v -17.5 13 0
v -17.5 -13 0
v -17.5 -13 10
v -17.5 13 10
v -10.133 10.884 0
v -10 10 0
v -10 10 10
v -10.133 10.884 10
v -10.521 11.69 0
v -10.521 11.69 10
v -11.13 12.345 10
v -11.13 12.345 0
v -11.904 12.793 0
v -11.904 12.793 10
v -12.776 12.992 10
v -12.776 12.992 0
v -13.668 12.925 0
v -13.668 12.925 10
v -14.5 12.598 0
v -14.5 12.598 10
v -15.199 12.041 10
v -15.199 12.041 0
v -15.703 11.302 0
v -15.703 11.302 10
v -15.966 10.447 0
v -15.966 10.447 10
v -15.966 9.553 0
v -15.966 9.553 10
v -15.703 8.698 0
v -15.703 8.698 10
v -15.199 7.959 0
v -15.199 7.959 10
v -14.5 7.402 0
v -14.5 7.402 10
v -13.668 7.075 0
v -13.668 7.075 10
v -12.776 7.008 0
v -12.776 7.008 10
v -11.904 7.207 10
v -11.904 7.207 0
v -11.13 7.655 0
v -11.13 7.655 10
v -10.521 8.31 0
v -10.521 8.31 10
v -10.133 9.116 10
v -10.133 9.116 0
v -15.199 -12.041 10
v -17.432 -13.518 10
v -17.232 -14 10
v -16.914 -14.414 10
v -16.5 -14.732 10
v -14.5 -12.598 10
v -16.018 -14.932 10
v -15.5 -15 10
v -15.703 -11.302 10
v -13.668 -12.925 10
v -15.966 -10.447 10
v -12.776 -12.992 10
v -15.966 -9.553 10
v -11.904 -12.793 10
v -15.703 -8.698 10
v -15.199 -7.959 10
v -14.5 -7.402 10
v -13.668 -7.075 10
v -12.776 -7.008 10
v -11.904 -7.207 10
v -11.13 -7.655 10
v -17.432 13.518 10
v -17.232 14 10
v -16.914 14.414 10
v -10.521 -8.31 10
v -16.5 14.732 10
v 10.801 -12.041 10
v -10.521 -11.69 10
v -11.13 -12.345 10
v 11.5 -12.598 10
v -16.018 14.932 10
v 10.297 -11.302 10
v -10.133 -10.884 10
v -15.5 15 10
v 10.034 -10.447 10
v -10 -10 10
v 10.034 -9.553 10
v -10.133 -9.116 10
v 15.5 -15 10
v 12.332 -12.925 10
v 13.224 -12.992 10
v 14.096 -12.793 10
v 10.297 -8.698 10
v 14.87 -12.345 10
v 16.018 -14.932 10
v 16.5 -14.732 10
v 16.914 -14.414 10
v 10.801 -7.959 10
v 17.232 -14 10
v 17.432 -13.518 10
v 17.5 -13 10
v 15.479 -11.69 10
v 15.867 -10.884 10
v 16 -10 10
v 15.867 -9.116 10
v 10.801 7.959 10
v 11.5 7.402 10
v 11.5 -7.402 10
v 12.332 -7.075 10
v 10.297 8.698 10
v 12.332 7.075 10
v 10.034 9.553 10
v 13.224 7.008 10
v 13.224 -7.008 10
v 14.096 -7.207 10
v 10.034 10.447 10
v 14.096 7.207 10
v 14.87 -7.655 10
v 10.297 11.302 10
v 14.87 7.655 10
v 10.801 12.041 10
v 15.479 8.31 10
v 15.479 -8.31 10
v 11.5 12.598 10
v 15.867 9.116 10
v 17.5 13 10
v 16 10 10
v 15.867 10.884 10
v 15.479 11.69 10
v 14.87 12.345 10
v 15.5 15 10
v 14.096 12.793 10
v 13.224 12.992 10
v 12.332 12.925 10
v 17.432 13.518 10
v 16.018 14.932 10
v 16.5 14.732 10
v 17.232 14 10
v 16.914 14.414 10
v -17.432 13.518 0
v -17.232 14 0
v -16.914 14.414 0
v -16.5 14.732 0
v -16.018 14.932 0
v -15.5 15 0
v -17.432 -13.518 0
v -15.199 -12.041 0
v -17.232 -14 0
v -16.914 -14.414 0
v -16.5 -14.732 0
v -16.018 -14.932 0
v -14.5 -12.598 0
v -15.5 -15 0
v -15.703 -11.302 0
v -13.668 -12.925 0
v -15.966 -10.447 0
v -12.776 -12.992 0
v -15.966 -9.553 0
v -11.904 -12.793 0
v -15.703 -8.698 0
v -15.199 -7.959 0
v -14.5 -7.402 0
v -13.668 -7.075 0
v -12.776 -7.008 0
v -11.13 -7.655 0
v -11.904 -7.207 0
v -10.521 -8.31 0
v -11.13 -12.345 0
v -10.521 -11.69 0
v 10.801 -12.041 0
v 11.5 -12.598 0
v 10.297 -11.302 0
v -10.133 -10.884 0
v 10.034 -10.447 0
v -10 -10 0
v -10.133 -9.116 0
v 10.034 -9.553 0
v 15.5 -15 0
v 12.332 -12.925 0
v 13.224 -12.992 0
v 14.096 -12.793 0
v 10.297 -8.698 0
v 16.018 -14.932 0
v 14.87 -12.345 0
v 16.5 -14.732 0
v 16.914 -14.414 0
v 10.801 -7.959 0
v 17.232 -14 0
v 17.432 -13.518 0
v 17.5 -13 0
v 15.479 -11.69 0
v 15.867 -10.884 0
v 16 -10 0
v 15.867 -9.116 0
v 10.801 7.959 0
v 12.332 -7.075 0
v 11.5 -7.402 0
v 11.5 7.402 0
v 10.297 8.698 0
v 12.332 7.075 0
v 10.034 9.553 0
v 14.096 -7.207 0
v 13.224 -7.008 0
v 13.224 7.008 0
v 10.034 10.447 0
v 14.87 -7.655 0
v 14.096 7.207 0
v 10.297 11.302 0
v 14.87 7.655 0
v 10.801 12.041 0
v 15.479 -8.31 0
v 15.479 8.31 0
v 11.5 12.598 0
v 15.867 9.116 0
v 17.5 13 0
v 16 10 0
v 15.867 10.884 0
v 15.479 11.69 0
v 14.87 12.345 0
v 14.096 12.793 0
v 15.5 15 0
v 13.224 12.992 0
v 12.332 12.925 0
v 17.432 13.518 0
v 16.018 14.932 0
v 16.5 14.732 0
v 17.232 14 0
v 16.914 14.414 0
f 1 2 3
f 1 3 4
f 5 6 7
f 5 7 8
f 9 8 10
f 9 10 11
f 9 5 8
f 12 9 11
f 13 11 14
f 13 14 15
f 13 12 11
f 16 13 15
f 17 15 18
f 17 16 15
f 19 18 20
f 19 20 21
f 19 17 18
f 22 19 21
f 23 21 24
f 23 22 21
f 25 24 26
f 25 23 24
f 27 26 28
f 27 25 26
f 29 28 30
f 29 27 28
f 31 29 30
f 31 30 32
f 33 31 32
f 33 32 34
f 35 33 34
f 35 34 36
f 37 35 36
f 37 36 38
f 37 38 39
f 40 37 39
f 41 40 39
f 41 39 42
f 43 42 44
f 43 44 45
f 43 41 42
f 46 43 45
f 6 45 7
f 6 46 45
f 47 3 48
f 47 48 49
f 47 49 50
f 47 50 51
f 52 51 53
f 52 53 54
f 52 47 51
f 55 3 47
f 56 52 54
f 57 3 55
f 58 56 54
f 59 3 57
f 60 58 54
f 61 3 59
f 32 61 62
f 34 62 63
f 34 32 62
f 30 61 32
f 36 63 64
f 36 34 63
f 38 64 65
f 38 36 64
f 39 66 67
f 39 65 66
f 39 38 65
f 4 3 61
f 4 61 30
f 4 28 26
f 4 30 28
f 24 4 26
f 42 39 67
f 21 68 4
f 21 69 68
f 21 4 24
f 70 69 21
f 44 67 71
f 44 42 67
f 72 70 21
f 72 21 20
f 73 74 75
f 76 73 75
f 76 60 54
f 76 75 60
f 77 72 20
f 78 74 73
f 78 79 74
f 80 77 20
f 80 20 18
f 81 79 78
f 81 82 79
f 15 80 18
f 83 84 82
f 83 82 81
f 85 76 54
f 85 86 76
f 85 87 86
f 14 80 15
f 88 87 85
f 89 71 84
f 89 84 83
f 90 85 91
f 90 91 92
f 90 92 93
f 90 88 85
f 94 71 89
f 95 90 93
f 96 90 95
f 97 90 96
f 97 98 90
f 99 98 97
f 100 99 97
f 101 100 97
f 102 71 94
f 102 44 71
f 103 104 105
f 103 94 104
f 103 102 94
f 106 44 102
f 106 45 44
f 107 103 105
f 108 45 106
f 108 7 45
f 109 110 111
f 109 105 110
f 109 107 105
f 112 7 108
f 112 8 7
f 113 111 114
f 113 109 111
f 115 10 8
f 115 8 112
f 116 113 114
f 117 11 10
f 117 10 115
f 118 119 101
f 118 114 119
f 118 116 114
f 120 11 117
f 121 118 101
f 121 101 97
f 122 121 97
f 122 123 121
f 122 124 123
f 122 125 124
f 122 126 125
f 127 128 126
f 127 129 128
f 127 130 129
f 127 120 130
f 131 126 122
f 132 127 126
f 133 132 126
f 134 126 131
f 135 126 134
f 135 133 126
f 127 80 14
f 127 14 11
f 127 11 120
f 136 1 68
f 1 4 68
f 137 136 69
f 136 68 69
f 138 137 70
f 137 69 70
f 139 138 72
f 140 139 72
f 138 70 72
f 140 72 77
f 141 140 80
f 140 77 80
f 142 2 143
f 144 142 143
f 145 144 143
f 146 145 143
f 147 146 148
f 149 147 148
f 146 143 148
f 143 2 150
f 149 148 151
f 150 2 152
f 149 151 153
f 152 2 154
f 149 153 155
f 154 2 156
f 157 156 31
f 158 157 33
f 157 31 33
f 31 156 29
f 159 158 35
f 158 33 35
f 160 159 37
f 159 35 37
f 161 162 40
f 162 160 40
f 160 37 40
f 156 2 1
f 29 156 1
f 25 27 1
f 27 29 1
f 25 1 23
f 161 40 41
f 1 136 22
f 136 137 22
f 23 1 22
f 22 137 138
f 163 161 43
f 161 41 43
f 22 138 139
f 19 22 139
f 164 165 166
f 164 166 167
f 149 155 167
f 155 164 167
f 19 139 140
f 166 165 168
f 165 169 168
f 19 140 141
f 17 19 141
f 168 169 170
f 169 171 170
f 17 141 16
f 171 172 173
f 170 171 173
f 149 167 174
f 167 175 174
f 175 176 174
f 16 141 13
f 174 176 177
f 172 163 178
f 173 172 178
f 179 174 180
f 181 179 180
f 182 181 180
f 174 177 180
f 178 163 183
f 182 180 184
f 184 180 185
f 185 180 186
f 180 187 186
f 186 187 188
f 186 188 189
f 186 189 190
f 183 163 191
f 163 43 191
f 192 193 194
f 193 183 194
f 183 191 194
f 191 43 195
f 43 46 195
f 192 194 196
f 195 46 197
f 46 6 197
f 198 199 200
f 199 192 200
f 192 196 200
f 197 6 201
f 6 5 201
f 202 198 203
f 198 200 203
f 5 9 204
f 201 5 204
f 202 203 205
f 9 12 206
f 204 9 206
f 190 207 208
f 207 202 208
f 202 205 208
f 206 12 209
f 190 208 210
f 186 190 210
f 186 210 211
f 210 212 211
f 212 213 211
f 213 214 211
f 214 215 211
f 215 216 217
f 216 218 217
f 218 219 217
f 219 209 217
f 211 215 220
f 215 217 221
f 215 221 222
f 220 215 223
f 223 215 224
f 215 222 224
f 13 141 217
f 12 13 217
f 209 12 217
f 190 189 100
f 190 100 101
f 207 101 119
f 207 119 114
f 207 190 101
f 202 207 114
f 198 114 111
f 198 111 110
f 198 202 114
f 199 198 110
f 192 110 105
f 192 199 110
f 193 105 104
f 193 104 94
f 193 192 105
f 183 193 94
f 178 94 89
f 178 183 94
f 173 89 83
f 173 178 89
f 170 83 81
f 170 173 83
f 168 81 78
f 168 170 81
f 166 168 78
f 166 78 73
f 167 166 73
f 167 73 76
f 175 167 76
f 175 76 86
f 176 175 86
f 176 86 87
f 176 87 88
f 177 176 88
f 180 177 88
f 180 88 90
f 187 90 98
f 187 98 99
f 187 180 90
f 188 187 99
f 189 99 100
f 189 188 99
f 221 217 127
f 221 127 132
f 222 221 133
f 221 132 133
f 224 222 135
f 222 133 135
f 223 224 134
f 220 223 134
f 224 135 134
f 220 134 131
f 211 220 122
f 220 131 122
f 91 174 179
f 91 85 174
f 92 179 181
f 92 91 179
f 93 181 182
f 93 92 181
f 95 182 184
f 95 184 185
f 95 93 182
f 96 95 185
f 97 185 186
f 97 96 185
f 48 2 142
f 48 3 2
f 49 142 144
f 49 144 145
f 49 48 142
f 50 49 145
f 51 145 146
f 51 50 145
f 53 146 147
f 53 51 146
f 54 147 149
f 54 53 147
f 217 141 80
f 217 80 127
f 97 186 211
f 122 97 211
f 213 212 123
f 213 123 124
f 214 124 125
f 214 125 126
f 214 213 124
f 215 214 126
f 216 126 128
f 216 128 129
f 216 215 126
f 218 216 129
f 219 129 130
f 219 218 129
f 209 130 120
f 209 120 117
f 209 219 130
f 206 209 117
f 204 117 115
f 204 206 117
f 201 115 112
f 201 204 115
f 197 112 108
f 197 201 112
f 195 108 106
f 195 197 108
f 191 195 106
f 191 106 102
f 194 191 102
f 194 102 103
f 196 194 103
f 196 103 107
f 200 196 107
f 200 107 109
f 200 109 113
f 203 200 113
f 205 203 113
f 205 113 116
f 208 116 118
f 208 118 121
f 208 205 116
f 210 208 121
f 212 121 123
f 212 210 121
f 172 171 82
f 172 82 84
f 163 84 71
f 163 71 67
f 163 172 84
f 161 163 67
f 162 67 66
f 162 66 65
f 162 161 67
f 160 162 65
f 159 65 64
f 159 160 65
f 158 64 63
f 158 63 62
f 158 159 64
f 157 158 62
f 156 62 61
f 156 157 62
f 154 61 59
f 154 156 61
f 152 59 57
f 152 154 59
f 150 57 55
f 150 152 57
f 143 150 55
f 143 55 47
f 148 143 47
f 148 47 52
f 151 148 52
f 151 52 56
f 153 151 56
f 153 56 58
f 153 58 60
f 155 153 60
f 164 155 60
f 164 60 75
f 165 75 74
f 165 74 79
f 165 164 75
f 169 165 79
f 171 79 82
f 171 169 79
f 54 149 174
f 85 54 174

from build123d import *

# Parameters (mm, degrees)
SKETCH_W  = 35
SKETCH_H  = 30
SKETCH_R  = 3
PAD_DEPTH = 10
FILLET_R  = 2


with BuildPart() as part:
    # Sketch → Pad (new body)
    with BuildSketch(Plane.XY):
        Rectangle(SKETCH_W, SKETCH_H)
        with Locations((-13, 10)):
            Circle(SKETCH_R, mode=Mode.SUBTRACT)
        with Locations((13, 10)):
            Circle(SKETCH_R, mode=Mode.SUBTRACT)
        with Locations((13, -10)):
            Circle(SKETCH_R, mode=Mode.SUBTRACT)
        with Locations((-13, -10)):
            Circle(SKETCH_R, mode=Mode.SUBTRACT)
    extrude(amount=PAD_DEPTH)

    # Fillet
    fillet_edges = [part.edges().sort_by_distance(p)[0] for p in [
        (-17.5, -15, 5),
        (17.5, -15, 5),
        (17.5, 15, 5),
        (-17.5, 15, 5),
    ]]
    fillet(fillet_edges, radius=FILLET_R)


solid = part.part
